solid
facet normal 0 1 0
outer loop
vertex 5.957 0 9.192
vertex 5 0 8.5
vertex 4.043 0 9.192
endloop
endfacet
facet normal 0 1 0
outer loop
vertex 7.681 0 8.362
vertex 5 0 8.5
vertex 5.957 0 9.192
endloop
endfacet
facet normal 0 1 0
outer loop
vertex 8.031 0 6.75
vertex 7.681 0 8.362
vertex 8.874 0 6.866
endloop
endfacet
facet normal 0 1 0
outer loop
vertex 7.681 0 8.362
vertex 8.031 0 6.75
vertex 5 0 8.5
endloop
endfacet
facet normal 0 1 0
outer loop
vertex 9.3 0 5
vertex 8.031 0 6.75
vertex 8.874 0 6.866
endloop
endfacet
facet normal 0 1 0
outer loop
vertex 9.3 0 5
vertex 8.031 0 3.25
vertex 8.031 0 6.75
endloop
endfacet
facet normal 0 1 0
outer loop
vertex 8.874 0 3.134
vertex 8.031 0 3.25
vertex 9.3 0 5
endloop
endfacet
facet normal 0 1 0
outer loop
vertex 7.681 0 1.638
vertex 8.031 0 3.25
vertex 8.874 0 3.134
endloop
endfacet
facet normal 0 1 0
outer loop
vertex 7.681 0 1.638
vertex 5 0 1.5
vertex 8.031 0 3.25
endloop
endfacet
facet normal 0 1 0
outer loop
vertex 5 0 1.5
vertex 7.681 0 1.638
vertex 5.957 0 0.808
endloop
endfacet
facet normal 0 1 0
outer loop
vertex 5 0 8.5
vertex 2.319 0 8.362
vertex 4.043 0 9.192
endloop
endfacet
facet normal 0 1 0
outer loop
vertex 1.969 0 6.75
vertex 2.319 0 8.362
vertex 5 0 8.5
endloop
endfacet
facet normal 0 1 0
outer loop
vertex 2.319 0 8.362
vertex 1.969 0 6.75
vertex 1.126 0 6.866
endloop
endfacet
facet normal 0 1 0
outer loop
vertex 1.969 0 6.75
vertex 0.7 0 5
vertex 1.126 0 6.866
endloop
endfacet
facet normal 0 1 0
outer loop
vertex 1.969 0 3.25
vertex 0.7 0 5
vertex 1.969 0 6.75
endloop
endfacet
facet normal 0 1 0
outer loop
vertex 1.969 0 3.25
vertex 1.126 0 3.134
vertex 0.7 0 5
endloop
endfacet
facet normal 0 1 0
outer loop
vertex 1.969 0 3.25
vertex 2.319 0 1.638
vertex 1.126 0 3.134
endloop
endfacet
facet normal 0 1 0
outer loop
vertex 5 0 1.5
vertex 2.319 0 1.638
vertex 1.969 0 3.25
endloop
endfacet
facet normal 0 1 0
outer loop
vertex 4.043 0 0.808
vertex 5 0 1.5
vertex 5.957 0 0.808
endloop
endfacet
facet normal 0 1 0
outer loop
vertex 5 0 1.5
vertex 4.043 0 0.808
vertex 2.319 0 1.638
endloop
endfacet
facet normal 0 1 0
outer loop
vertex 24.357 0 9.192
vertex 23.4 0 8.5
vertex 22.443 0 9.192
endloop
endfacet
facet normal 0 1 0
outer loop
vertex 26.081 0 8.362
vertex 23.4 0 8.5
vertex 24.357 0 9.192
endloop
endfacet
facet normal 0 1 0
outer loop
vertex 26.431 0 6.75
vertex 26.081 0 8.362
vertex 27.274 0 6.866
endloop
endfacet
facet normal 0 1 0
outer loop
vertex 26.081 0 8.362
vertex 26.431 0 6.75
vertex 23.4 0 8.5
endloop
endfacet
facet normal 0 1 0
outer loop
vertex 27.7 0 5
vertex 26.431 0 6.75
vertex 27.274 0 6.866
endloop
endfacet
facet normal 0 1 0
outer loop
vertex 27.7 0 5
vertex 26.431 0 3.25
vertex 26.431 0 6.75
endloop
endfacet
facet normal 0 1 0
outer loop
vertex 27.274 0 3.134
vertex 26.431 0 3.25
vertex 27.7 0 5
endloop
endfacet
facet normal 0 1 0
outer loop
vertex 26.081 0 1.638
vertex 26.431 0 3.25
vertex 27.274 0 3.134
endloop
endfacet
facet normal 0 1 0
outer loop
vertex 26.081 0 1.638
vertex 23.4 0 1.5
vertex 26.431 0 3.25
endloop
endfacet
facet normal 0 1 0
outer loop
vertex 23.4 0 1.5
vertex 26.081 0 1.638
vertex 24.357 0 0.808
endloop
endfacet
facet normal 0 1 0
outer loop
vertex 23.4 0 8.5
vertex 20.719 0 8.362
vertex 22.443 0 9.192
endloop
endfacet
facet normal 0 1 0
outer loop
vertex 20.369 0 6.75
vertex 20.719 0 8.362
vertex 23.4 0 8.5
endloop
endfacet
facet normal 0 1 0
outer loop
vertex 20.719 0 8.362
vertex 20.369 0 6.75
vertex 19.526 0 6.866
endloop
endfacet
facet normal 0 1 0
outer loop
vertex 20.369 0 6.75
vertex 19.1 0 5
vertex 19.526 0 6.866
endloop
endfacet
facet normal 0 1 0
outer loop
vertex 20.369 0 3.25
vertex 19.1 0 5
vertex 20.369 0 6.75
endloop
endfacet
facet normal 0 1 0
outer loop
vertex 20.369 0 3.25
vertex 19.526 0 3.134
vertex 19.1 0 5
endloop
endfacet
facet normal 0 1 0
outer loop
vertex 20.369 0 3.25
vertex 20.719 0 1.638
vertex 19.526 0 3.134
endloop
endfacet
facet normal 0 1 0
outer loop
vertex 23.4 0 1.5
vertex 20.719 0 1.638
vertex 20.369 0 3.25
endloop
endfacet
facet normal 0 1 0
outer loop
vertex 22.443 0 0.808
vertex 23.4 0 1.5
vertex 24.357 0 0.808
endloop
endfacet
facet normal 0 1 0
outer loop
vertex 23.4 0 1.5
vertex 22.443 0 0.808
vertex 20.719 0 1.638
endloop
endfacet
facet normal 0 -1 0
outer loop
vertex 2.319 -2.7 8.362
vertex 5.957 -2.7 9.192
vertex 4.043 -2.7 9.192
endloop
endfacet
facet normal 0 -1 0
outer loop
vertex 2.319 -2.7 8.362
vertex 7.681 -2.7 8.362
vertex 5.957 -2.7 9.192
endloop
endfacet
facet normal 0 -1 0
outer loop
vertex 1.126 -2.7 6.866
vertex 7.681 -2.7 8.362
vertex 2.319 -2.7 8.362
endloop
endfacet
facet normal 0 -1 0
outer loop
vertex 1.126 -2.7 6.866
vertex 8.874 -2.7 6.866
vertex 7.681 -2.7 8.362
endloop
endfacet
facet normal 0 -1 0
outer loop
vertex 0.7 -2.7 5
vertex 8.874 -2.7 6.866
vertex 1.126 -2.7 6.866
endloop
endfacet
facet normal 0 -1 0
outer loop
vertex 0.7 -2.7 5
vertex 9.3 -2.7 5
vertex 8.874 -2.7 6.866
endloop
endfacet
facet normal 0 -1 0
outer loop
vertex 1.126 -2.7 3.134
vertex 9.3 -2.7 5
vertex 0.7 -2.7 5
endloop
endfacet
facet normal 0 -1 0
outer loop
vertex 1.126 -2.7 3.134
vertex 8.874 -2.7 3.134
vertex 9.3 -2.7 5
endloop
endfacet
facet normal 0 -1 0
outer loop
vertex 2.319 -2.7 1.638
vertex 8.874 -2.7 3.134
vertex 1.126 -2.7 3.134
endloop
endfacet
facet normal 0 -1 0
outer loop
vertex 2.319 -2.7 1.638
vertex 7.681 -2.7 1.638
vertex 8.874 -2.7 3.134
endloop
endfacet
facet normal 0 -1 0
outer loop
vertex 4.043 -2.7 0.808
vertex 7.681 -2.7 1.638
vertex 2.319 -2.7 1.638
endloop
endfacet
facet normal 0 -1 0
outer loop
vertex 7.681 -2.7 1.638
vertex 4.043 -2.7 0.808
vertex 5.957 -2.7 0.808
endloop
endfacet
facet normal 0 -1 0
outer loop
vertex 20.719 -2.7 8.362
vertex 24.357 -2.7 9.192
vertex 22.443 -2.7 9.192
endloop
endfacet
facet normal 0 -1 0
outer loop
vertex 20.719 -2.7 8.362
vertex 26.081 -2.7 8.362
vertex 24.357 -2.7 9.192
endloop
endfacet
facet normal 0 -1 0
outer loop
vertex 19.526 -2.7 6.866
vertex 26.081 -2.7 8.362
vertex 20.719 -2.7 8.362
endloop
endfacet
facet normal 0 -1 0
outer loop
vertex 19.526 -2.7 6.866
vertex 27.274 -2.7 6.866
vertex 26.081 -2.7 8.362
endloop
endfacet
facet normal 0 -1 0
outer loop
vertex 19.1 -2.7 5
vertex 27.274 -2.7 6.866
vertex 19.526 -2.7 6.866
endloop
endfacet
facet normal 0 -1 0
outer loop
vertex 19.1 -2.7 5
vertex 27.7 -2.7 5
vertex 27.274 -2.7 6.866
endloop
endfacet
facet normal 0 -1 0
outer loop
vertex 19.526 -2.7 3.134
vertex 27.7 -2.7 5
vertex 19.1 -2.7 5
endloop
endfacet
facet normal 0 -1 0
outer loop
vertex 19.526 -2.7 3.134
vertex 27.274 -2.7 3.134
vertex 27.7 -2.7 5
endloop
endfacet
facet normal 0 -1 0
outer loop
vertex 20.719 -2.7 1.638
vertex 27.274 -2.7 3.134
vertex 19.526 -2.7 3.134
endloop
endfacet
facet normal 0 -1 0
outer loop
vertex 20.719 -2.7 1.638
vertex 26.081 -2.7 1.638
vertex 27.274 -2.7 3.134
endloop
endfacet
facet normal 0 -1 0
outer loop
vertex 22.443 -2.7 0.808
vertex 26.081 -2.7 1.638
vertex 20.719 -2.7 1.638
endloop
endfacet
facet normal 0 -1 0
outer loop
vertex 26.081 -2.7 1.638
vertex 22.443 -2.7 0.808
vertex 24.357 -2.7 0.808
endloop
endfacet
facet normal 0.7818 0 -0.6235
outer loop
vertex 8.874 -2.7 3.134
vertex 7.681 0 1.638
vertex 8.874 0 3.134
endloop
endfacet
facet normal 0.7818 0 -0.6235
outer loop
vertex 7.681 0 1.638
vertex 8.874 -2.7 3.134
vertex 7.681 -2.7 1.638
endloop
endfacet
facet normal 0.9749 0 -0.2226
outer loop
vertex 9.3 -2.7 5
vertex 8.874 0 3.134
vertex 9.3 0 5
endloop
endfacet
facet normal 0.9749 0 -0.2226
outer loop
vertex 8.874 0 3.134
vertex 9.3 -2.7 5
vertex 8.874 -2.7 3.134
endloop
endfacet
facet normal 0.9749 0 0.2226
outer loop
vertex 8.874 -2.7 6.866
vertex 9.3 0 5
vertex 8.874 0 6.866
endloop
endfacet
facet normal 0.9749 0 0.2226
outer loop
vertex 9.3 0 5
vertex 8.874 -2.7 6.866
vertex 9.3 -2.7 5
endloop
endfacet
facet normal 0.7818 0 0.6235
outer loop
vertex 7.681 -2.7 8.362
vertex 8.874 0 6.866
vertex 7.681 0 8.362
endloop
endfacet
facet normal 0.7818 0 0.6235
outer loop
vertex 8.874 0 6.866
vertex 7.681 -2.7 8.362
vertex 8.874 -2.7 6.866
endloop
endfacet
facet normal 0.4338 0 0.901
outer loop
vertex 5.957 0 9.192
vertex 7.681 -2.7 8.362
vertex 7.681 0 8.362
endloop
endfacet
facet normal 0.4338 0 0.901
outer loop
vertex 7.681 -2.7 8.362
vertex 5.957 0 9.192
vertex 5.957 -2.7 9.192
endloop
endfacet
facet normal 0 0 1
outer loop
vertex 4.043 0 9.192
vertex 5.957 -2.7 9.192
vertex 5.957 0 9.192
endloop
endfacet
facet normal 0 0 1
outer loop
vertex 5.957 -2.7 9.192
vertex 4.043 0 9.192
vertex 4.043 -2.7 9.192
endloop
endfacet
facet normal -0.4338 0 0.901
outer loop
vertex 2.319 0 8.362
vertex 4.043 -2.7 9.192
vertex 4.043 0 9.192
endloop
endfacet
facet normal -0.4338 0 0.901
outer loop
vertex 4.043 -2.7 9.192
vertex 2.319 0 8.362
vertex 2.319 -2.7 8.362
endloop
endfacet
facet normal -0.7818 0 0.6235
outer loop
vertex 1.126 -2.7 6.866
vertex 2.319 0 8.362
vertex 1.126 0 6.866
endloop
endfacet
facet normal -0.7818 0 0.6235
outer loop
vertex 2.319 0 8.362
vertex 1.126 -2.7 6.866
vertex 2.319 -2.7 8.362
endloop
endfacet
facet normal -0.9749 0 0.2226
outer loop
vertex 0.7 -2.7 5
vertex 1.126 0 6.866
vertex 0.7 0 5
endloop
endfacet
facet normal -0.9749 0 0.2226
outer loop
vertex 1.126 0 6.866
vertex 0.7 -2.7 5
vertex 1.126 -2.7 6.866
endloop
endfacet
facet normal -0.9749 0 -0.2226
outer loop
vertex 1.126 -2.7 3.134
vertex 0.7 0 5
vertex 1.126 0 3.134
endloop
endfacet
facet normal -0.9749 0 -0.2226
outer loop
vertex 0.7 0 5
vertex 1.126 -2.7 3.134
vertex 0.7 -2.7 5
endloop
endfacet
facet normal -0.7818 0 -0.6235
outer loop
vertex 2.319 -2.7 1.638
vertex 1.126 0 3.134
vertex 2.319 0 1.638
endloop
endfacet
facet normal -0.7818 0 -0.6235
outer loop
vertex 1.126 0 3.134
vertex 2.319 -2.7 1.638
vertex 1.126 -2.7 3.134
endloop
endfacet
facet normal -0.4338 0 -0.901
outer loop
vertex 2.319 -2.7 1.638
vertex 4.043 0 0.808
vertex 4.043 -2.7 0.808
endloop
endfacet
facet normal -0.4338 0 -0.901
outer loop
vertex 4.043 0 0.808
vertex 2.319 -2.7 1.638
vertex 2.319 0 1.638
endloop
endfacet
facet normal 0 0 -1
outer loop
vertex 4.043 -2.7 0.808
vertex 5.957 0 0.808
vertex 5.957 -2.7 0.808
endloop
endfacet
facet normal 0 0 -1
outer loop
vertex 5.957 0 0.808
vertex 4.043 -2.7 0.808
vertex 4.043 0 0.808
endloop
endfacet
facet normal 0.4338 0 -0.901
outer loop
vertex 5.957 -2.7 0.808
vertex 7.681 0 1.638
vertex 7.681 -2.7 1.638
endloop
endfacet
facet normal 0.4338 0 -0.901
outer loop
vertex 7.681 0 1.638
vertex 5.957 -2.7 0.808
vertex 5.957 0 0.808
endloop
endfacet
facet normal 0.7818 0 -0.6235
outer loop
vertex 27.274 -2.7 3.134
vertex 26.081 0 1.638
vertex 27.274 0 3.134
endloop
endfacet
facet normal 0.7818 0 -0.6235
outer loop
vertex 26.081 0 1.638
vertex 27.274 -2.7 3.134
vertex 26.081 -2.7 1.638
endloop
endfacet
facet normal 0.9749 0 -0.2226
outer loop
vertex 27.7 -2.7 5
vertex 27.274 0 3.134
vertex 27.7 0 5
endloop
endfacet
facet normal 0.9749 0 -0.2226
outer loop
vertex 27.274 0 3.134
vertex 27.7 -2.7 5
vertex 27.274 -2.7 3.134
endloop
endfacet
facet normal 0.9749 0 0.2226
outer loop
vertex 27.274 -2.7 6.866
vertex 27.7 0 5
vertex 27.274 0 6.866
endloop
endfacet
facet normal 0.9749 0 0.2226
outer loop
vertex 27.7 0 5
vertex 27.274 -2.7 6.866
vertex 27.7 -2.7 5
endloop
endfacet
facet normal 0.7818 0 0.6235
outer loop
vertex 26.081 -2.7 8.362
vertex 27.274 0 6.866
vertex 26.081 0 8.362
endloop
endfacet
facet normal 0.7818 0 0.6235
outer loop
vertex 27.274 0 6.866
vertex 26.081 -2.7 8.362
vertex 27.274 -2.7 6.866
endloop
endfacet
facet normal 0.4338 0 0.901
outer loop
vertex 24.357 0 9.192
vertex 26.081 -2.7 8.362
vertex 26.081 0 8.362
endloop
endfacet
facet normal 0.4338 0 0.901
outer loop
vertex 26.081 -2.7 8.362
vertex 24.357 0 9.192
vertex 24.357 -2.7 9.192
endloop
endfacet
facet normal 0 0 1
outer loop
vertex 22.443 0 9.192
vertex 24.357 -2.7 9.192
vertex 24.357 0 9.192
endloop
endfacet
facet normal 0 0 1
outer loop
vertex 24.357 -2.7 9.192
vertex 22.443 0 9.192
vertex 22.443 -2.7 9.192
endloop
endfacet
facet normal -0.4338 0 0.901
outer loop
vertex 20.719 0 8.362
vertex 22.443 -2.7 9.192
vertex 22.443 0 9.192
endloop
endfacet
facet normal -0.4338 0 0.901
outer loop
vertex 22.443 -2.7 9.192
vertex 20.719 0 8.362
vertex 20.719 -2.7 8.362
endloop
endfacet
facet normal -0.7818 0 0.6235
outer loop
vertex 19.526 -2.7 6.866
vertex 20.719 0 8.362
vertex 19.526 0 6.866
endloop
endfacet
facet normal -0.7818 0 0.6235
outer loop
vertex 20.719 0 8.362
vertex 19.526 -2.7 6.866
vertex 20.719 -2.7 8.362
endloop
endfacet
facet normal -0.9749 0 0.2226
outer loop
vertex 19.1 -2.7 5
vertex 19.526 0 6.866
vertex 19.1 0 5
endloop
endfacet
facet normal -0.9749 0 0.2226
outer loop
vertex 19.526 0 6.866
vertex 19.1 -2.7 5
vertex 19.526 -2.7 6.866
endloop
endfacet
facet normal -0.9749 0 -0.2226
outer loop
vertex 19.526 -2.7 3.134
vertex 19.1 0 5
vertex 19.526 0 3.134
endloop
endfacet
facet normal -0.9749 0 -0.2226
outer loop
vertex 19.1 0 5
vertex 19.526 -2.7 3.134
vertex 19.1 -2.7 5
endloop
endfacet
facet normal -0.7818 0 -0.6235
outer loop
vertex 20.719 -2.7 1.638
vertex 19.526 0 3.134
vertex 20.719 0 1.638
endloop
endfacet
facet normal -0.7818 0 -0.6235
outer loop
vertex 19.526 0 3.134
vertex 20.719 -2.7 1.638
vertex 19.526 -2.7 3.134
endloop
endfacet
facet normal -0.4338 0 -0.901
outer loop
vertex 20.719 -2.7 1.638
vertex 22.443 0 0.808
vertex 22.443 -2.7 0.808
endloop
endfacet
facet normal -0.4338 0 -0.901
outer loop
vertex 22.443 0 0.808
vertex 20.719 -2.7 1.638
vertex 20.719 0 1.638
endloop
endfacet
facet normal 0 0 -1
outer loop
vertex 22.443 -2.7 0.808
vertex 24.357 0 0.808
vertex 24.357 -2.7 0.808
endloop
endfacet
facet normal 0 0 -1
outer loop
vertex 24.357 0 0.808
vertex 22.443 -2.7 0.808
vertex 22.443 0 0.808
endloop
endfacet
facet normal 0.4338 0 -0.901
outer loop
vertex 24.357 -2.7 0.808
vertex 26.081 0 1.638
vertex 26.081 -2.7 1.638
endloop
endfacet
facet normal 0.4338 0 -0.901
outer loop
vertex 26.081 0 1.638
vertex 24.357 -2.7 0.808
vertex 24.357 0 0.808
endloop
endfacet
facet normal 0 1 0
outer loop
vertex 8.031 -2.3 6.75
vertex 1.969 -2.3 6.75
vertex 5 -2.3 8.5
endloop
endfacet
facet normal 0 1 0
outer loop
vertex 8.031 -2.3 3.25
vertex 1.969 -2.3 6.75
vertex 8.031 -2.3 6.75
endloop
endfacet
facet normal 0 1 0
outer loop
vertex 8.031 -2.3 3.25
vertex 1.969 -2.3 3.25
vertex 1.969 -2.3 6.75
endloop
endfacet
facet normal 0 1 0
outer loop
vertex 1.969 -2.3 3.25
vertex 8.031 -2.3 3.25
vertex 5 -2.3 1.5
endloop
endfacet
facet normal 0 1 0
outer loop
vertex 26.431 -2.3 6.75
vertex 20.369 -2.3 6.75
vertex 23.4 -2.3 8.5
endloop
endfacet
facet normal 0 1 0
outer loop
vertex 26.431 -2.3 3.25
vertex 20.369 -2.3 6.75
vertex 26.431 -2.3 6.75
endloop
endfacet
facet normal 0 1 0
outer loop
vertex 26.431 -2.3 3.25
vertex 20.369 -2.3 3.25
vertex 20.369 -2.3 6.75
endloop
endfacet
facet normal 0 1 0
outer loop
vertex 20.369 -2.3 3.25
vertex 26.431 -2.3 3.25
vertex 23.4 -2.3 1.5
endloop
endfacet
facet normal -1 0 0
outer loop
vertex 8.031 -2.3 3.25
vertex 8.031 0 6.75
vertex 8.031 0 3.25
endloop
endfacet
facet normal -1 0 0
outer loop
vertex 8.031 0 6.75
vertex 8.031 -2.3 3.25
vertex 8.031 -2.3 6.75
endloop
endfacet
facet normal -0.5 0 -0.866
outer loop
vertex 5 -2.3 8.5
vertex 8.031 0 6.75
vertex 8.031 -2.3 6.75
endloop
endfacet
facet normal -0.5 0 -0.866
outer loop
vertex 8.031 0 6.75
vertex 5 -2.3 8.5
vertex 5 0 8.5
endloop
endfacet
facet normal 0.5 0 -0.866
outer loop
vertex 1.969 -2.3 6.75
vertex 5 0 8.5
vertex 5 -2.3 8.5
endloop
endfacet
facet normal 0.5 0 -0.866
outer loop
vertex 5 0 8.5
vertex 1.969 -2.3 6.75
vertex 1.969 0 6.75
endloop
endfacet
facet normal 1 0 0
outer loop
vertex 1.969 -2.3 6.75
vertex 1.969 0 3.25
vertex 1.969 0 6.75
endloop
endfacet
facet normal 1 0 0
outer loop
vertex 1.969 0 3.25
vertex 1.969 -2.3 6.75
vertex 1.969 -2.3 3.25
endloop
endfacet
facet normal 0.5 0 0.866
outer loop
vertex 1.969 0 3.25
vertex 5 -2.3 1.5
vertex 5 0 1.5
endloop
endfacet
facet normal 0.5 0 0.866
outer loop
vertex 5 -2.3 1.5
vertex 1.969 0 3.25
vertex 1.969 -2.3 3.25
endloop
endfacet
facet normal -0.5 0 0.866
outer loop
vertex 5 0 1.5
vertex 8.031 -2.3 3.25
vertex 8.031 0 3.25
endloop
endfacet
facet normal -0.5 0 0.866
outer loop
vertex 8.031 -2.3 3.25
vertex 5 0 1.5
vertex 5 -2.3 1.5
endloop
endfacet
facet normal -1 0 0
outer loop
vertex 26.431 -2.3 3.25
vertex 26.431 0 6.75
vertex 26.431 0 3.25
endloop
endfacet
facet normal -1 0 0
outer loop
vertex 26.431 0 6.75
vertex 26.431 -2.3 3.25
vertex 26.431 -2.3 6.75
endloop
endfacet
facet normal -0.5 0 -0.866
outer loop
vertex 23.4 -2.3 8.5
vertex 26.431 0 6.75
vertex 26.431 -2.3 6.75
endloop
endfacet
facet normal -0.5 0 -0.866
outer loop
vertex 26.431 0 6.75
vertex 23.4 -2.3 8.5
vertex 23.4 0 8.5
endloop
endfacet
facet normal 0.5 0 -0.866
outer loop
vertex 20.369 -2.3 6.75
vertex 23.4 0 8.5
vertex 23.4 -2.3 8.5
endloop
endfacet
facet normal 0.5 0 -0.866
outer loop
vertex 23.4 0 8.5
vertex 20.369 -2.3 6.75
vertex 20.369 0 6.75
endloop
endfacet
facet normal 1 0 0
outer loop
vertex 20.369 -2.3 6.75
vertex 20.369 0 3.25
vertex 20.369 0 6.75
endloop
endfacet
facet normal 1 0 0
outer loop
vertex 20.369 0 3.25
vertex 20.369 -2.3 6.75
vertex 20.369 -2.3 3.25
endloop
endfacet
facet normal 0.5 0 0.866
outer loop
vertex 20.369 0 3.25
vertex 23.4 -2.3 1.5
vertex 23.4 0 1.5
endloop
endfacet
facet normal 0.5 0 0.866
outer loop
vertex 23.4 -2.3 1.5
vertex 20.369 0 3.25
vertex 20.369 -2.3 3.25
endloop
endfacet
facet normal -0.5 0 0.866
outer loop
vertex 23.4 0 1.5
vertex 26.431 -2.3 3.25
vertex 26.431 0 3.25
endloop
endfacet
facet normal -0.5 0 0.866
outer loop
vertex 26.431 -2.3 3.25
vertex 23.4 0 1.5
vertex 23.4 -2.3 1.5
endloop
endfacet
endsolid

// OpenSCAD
// Copyright (C) 2025 Arif K. Rafiq
// This program is free software: you can redistribute it and/or modify
// it under the terms of the GNU General Public License as published by
// the Free Software Foundation, either version 3 of the License, or
// (at your option) any later version.

// This program is distributed in the hope that it will be useful,
// but WITHOUT ANY WARRANTY; without even the implied warranty of
// MERCHANTABILITY or FITNESS FOR A PARTICULAR PURPOSE.  See the
// GNU General Public License for more details.

// You should have received a copy of the GNU General Public License
// along with this file.  If not, see <https://www.gnu.org/licenses/>,
// or write to: license@temperedoptimism.com


// NOTHING SHOWS
// Fixed in example3.scad

tWallMin = [0.40, 0.40, 0.16];         // Modified
pHexSink = [3.5, 2.3];
vTerminal0 = [5.0, 5.0];
vTerminal1 = [23.4, 5.0];
fx0=2;    //convexity
tEps=0.01; // Fixing conflicting bodies

//25:00
// Rotate
rotate([90,0,0]){
  difference(){
    // hex pocket surround
    // Read about render(convexity)    
                               // Modified      
    linear_extrude(pHexSink.y+ tWallMin.y, convexity=fx0){  
                                                 // Modified
      translate(vTerminal0)  circle(pHexSink.x +(tWallMin.x *2));
      translate(vTerminal1)  circle(pHexSink.x +(tWallMin.x *2));
    }
    //hex pocket
    // Solve Conflicting bodies
    translate([0,0, -tEps]) linear_extrude(pHexSink.y+tEps, convexity=fx0){
      translate(vTerminal0)  rotate([0,0,30]) circle(pHexSink.x, $fn=6);
      translate(vTerminal1)  rotate([0,0,30]) circle(pHexSink.x, $fn=6);
    }
  }
}
